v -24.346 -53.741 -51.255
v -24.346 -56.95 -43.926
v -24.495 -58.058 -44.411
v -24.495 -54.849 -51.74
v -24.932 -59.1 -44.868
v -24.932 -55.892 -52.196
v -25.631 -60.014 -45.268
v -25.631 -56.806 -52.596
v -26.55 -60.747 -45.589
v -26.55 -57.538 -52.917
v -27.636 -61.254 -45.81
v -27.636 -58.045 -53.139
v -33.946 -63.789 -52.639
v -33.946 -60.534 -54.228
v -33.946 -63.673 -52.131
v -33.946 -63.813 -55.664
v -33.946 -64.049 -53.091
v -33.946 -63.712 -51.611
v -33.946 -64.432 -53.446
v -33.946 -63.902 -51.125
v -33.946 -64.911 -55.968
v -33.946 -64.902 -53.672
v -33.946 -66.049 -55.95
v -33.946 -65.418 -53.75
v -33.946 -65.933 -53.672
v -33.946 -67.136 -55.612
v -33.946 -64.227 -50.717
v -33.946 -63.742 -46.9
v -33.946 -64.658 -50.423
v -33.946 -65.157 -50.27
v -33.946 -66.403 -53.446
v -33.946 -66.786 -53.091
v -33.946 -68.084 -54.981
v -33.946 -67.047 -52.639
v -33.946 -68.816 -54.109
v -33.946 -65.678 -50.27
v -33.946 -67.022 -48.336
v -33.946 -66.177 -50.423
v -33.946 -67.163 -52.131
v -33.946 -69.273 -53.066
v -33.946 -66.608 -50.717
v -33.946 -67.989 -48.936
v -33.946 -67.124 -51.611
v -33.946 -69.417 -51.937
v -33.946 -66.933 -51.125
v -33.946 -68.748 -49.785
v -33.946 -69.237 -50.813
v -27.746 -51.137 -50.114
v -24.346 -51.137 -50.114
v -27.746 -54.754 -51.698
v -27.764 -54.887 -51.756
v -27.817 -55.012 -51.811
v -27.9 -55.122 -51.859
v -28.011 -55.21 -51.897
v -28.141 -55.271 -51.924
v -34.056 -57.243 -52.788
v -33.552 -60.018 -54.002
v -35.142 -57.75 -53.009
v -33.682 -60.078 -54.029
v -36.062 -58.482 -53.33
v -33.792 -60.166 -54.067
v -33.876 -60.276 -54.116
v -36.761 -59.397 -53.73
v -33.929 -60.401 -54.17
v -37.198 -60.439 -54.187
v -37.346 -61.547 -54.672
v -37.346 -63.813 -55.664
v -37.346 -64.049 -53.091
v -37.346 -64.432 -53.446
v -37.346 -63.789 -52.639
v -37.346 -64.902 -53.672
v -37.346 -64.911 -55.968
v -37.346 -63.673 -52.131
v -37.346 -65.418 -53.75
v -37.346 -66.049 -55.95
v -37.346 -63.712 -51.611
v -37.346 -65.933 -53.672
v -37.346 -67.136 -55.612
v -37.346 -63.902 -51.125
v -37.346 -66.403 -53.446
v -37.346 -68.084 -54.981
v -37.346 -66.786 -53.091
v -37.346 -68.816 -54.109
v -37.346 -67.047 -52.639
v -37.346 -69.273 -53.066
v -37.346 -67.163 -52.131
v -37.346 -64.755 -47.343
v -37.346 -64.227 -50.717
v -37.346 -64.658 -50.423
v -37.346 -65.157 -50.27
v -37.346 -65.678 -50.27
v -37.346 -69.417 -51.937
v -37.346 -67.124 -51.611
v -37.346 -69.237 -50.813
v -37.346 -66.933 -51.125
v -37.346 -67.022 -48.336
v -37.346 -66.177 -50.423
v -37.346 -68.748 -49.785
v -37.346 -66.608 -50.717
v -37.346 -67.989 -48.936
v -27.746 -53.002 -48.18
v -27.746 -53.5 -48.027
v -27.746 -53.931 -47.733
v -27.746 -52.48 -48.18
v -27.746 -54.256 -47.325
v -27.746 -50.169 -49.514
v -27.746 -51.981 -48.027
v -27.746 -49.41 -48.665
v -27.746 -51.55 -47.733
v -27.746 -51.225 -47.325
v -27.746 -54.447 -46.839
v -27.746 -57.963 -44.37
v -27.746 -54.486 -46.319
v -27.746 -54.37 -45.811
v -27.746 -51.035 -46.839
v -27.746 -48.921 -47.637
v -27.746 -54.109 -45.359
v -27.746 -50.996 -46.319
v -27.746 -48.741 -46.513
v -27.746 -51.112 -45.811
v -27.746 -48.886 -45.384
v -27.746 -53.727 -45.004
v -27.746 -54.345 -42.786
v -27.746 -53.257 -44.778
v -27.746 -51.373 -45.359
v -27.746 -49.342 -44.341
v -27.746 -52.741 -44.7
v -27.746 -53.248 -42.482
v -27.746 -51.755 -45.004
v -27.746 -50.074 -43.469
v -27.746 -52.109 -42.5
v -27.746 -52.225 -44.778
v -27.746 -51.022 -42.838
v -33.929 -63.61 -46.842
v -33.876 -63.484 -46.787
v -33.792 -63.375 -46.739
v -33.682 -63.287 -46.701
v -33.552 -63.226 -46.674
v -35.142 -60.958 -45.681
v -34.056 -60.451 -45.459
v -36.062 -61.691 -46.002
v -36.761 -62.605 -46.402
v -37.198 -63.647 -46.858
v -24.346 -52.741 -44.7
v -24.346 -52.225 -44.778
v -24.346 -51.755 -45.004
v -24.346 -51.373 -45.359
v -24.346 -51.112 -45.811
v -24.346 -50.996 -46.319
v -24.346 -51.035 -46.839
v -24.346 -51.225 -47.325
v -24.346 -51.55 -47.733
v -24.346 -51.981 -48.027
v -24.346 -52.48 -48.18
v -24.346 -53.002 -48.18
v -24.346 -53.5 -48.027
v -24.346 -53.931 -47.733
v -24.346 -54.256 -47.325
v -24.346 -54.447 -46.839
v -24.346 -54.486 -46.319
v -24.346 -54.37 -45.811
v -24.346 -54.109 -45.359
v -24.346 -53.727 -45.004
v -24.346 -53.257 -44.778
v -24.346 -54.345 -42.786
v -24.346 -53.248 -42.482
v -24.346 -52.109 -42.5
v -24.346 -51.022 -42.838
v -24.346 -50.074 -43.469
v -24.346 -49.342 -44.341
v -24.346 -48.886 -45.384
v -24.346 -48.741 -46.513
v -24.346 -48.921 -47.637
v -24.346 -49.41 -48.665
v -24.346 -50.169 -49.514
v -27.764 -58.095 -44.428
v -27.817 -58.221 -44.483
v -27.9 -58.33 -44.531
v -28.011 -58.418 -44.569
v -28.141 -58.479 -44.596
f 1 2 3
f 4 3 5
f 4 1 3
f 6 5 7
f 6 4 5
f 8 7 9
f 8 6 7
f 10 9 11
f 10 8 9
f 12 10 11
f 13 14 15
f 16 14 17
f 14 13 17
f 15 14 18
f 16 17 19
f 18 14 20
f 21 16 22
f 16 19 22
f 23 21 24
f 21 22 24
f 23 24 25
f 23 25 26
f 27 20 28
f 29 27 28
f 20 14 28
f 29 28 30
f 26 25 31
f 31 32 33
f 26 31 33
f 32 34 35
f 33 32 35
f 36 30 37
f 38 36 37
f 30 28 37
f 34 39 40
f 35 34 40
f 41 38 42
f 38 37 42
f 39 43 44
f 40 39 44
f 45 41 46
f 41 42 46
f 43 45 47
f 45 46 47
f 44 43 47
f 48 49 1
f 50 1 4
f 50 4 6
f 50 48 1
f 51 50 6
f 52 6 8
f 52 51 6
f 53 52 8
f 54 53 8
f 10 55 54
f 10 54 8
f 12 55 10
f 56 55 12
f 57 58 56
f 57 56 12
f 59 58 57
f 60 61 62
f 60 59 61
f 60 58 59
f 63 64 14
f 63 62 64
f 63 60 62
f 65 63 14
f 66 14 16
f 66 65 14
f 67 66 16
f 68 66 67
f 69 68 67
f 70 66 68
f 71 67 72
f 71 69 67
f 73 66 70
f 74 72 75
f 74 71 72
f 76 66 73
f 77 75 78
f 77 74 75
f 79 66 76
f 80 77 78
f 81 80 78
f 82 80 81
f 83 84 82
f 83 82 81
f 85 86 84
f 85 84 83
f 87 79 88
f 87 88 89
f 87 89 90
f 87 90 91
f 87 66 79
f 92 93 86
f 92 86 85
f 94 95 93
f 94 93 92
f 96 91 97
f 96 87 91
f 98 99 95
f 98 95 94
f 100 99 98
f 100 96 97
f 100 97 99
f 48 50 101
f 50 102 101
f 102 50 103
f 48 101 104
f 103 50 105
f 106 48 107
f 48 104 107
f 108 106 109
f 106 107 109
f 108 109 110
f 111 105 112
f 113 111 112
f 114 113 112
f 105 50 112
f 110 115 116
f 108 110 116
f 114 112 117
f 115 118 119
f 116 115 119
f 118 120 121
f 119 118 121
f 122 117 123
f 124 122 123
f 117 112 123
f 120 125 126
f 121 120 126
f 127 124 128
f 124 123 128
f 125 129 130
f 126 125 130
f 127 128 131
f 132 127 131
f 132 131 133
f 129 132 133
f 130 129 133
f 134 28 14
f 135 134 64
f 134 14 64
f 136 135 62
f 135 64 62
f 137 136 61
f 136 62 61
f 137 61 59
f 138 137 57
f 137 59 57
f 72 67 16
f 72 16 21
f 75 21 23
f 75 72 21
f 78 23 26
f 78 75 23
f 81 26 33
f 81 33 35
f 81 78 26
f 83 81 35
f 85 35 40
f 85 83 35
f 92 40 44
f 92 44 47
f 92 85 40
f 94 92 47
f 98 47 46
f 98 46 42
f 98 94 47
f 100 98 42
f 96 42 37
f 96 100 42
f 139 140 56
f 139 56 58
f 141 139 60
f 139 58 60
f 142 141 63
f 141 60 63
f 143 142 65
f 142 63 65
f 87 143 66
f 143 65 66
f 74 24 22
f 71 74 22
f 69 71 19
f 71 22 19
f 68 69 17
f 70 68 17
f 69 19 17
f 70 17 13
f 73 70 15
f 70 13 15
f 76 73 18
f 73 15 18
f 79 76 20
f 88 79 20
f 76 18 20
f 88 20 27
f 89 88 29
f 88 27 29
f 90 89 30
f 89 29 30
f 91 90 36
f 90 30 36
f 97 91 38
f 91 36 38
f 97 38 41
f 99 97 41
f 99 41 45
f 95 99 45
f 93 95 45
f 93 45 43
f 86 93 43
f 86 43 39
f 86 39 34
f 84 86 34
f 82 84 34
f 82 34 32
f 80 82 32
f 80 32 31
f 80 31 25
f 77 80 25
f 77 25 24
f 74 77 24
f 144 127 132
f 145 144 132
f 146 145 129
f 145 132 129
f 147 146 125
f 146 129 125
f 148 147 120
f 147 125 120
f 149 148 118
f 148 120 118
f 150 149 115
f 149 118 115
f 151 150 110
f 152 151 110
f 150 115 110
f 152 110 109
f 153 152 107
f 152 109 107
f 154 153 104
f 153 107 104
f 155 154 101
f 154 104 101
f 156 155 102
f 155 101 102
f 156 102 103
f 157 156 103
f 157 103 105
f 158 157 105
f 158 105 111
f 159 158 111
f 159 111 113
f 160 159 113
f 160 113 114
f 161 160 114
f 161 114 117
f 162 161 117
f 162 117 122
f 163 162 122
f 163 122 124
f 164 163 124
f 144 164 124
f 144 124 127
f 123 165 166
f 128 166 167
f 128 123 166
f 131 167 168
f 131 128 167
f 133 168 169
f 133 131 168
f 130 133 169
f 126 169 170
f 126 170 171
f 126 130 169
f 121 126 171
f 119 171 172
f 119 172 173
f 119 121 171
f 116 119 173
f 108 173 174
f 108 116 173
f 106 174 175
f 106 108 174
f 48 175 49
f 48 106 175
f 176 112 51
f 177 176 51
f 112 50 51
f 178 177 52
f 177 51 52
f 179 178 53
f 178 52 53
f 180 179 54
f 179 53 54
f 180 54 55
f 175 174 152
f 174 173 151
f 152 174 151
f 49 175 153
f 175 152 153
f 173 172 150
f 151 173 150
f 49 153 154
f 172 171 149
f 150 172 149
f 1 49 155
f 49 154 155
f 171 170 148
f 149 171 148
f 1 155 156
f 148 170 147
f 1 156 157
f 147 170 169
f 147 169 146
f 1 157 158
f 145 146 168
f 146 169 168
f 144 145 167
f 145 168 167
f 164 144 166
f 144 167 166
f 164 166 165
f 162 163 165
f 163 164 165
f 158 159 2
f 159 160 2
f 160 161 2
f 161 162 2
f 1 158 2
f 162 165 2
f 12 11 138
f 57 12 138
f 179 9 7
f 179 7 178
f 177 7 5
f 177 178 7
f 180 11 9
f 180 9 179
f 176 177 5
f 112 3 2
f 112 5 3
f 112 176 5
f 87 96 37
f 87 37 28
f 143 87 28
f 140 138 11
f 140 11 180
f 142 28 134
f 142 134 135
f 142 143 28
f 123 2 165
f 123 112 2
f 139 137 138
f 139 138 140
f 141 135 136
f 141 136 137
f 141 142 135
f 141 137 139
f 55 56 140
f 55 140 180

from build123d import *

# Parameters (mm, degrees)
BOSS_EXTRUDE1_DEPTH = 13
SKETCH2_W           = 9.6
SKETCH2_H           = 12.263448081
CUT_EXTRUDE1_DEPTH  = 94.999820378
DRAFT1_ANGLE        = 20
CUT_EXTRUDE2_DEPTH  = 94.999820378
HOLE1_D             = 3.5
HOLE2_D             = 3.5
FILLET1_R           = 0.6
FILLET2_R           = 5


with BuildPart() as part:
    # Sketch1 → Boss-Extrude1 (new body)
    with BuildSketch(Plane(origin=(-37.346370889, 0, 0), x_dir=(0, -1, 0), z_dir=(-1, 0, 0))):
        with BuildLine():
            Line((51.136566376, -50.11421745), (63.813413447, -55.66421745))
            ThreePointArc((63.813413447, -55.66421745), (69.081847366, -53.604216469), (67.021846385, -48.33578255))
            Line((67.021846385, -48.33578255), (54.344999314, -42.78578255))
            ThreePointArc((54.344999314, -42.78578255), (49.076565395, -44.845783531), (51.136566376, -50.11421745))
        make_face()
    extrude(amount=-BOSS_EXTRUDE1_DEPTH)

    # Sketch2 → Cut-Extrude1 (cut, through all)
    with BuildSketch(Plane(origin=(0, 6.977867205, -15.938262243), x_dir=(1, 0, 0), z_dir=(0, -0.4010541172489907, 0.9160543624903671))):
        with Locations((-32.546370889, -68.673916916)):
            Rectangle(SKETCH2_W, SKETCH2_H)
    extrude(amount=-CUT_EXTRUDE1_DEPTH, mode=Mode.SUBTRACT)

    # Draft1
    draft1_faces = [part.faces().sort_by_distance(p)[0] for p in [
        (-32.546370889, -59.943950062, -49.603589992),
    ]]
    draft(draft1_faces, Plane(origin=(-37.346370889, -52.740782845, -46.45), x_dir=(0, -1, 0), z_dir=(-1, 0, 0)), DRAFT1_ANGLE)

    # Sketch3 → Cut-Extrude2 (cut, through all)
    with BuildSketch(Plane(origin=(0, 6.977867205, -15.938262243), x_dir=(1, 0, 0), z_dir=(0, -0.4010541172489907, 0.9160543624903671))):
        Polygon((-18.270337706, -85.869129535), (-18.270337706, -71.075309896), (-33.946370889, -76.780919366), (-33.946370889, -85.869129535), align=None)
    extrude(amount=-CUT_EXTRUDE2_DEPTH, mode=Mode.SUBTRACT)

    # Hole1 (through all)
    with Locations(Plane.ZY.offset(37.346370889)):
        with Locations((-52, -65.417629916)):
            Hole(HOLE1_D / 2)

    # Hole2 (through all)
    with Locations(Plane(origin=(-24.346370889, 0, 0), x_dir=(0, 0, -1), z_dir=(1, 0, 0))):
        with Locations((46.45, -52.740782845)):
            Hole(HOLE2_D / 2)

    # Fillet1
    fillet1_edges = [part.edges().sort_by_distance(p)[0] for p in [
        (-27.746370889, -56.743151462, -48.202261087),
        (-33.946370889, -61.753412466, -50.395783531),
    ]]
    fillet(fillet1_edges, radius=FILLET1_R)

    # Fillet2
    fillet2_edges = [part.edges().sort_by_distance(p)[0] for p in [
        (-37.346370889, -59.943950062, -49.603589992),
        (-24.346370889, -58.552613866, -48.994454625),
    ]]
    fillet(fillet2_edges, radius=FILLET2_R)


solid = part.part
